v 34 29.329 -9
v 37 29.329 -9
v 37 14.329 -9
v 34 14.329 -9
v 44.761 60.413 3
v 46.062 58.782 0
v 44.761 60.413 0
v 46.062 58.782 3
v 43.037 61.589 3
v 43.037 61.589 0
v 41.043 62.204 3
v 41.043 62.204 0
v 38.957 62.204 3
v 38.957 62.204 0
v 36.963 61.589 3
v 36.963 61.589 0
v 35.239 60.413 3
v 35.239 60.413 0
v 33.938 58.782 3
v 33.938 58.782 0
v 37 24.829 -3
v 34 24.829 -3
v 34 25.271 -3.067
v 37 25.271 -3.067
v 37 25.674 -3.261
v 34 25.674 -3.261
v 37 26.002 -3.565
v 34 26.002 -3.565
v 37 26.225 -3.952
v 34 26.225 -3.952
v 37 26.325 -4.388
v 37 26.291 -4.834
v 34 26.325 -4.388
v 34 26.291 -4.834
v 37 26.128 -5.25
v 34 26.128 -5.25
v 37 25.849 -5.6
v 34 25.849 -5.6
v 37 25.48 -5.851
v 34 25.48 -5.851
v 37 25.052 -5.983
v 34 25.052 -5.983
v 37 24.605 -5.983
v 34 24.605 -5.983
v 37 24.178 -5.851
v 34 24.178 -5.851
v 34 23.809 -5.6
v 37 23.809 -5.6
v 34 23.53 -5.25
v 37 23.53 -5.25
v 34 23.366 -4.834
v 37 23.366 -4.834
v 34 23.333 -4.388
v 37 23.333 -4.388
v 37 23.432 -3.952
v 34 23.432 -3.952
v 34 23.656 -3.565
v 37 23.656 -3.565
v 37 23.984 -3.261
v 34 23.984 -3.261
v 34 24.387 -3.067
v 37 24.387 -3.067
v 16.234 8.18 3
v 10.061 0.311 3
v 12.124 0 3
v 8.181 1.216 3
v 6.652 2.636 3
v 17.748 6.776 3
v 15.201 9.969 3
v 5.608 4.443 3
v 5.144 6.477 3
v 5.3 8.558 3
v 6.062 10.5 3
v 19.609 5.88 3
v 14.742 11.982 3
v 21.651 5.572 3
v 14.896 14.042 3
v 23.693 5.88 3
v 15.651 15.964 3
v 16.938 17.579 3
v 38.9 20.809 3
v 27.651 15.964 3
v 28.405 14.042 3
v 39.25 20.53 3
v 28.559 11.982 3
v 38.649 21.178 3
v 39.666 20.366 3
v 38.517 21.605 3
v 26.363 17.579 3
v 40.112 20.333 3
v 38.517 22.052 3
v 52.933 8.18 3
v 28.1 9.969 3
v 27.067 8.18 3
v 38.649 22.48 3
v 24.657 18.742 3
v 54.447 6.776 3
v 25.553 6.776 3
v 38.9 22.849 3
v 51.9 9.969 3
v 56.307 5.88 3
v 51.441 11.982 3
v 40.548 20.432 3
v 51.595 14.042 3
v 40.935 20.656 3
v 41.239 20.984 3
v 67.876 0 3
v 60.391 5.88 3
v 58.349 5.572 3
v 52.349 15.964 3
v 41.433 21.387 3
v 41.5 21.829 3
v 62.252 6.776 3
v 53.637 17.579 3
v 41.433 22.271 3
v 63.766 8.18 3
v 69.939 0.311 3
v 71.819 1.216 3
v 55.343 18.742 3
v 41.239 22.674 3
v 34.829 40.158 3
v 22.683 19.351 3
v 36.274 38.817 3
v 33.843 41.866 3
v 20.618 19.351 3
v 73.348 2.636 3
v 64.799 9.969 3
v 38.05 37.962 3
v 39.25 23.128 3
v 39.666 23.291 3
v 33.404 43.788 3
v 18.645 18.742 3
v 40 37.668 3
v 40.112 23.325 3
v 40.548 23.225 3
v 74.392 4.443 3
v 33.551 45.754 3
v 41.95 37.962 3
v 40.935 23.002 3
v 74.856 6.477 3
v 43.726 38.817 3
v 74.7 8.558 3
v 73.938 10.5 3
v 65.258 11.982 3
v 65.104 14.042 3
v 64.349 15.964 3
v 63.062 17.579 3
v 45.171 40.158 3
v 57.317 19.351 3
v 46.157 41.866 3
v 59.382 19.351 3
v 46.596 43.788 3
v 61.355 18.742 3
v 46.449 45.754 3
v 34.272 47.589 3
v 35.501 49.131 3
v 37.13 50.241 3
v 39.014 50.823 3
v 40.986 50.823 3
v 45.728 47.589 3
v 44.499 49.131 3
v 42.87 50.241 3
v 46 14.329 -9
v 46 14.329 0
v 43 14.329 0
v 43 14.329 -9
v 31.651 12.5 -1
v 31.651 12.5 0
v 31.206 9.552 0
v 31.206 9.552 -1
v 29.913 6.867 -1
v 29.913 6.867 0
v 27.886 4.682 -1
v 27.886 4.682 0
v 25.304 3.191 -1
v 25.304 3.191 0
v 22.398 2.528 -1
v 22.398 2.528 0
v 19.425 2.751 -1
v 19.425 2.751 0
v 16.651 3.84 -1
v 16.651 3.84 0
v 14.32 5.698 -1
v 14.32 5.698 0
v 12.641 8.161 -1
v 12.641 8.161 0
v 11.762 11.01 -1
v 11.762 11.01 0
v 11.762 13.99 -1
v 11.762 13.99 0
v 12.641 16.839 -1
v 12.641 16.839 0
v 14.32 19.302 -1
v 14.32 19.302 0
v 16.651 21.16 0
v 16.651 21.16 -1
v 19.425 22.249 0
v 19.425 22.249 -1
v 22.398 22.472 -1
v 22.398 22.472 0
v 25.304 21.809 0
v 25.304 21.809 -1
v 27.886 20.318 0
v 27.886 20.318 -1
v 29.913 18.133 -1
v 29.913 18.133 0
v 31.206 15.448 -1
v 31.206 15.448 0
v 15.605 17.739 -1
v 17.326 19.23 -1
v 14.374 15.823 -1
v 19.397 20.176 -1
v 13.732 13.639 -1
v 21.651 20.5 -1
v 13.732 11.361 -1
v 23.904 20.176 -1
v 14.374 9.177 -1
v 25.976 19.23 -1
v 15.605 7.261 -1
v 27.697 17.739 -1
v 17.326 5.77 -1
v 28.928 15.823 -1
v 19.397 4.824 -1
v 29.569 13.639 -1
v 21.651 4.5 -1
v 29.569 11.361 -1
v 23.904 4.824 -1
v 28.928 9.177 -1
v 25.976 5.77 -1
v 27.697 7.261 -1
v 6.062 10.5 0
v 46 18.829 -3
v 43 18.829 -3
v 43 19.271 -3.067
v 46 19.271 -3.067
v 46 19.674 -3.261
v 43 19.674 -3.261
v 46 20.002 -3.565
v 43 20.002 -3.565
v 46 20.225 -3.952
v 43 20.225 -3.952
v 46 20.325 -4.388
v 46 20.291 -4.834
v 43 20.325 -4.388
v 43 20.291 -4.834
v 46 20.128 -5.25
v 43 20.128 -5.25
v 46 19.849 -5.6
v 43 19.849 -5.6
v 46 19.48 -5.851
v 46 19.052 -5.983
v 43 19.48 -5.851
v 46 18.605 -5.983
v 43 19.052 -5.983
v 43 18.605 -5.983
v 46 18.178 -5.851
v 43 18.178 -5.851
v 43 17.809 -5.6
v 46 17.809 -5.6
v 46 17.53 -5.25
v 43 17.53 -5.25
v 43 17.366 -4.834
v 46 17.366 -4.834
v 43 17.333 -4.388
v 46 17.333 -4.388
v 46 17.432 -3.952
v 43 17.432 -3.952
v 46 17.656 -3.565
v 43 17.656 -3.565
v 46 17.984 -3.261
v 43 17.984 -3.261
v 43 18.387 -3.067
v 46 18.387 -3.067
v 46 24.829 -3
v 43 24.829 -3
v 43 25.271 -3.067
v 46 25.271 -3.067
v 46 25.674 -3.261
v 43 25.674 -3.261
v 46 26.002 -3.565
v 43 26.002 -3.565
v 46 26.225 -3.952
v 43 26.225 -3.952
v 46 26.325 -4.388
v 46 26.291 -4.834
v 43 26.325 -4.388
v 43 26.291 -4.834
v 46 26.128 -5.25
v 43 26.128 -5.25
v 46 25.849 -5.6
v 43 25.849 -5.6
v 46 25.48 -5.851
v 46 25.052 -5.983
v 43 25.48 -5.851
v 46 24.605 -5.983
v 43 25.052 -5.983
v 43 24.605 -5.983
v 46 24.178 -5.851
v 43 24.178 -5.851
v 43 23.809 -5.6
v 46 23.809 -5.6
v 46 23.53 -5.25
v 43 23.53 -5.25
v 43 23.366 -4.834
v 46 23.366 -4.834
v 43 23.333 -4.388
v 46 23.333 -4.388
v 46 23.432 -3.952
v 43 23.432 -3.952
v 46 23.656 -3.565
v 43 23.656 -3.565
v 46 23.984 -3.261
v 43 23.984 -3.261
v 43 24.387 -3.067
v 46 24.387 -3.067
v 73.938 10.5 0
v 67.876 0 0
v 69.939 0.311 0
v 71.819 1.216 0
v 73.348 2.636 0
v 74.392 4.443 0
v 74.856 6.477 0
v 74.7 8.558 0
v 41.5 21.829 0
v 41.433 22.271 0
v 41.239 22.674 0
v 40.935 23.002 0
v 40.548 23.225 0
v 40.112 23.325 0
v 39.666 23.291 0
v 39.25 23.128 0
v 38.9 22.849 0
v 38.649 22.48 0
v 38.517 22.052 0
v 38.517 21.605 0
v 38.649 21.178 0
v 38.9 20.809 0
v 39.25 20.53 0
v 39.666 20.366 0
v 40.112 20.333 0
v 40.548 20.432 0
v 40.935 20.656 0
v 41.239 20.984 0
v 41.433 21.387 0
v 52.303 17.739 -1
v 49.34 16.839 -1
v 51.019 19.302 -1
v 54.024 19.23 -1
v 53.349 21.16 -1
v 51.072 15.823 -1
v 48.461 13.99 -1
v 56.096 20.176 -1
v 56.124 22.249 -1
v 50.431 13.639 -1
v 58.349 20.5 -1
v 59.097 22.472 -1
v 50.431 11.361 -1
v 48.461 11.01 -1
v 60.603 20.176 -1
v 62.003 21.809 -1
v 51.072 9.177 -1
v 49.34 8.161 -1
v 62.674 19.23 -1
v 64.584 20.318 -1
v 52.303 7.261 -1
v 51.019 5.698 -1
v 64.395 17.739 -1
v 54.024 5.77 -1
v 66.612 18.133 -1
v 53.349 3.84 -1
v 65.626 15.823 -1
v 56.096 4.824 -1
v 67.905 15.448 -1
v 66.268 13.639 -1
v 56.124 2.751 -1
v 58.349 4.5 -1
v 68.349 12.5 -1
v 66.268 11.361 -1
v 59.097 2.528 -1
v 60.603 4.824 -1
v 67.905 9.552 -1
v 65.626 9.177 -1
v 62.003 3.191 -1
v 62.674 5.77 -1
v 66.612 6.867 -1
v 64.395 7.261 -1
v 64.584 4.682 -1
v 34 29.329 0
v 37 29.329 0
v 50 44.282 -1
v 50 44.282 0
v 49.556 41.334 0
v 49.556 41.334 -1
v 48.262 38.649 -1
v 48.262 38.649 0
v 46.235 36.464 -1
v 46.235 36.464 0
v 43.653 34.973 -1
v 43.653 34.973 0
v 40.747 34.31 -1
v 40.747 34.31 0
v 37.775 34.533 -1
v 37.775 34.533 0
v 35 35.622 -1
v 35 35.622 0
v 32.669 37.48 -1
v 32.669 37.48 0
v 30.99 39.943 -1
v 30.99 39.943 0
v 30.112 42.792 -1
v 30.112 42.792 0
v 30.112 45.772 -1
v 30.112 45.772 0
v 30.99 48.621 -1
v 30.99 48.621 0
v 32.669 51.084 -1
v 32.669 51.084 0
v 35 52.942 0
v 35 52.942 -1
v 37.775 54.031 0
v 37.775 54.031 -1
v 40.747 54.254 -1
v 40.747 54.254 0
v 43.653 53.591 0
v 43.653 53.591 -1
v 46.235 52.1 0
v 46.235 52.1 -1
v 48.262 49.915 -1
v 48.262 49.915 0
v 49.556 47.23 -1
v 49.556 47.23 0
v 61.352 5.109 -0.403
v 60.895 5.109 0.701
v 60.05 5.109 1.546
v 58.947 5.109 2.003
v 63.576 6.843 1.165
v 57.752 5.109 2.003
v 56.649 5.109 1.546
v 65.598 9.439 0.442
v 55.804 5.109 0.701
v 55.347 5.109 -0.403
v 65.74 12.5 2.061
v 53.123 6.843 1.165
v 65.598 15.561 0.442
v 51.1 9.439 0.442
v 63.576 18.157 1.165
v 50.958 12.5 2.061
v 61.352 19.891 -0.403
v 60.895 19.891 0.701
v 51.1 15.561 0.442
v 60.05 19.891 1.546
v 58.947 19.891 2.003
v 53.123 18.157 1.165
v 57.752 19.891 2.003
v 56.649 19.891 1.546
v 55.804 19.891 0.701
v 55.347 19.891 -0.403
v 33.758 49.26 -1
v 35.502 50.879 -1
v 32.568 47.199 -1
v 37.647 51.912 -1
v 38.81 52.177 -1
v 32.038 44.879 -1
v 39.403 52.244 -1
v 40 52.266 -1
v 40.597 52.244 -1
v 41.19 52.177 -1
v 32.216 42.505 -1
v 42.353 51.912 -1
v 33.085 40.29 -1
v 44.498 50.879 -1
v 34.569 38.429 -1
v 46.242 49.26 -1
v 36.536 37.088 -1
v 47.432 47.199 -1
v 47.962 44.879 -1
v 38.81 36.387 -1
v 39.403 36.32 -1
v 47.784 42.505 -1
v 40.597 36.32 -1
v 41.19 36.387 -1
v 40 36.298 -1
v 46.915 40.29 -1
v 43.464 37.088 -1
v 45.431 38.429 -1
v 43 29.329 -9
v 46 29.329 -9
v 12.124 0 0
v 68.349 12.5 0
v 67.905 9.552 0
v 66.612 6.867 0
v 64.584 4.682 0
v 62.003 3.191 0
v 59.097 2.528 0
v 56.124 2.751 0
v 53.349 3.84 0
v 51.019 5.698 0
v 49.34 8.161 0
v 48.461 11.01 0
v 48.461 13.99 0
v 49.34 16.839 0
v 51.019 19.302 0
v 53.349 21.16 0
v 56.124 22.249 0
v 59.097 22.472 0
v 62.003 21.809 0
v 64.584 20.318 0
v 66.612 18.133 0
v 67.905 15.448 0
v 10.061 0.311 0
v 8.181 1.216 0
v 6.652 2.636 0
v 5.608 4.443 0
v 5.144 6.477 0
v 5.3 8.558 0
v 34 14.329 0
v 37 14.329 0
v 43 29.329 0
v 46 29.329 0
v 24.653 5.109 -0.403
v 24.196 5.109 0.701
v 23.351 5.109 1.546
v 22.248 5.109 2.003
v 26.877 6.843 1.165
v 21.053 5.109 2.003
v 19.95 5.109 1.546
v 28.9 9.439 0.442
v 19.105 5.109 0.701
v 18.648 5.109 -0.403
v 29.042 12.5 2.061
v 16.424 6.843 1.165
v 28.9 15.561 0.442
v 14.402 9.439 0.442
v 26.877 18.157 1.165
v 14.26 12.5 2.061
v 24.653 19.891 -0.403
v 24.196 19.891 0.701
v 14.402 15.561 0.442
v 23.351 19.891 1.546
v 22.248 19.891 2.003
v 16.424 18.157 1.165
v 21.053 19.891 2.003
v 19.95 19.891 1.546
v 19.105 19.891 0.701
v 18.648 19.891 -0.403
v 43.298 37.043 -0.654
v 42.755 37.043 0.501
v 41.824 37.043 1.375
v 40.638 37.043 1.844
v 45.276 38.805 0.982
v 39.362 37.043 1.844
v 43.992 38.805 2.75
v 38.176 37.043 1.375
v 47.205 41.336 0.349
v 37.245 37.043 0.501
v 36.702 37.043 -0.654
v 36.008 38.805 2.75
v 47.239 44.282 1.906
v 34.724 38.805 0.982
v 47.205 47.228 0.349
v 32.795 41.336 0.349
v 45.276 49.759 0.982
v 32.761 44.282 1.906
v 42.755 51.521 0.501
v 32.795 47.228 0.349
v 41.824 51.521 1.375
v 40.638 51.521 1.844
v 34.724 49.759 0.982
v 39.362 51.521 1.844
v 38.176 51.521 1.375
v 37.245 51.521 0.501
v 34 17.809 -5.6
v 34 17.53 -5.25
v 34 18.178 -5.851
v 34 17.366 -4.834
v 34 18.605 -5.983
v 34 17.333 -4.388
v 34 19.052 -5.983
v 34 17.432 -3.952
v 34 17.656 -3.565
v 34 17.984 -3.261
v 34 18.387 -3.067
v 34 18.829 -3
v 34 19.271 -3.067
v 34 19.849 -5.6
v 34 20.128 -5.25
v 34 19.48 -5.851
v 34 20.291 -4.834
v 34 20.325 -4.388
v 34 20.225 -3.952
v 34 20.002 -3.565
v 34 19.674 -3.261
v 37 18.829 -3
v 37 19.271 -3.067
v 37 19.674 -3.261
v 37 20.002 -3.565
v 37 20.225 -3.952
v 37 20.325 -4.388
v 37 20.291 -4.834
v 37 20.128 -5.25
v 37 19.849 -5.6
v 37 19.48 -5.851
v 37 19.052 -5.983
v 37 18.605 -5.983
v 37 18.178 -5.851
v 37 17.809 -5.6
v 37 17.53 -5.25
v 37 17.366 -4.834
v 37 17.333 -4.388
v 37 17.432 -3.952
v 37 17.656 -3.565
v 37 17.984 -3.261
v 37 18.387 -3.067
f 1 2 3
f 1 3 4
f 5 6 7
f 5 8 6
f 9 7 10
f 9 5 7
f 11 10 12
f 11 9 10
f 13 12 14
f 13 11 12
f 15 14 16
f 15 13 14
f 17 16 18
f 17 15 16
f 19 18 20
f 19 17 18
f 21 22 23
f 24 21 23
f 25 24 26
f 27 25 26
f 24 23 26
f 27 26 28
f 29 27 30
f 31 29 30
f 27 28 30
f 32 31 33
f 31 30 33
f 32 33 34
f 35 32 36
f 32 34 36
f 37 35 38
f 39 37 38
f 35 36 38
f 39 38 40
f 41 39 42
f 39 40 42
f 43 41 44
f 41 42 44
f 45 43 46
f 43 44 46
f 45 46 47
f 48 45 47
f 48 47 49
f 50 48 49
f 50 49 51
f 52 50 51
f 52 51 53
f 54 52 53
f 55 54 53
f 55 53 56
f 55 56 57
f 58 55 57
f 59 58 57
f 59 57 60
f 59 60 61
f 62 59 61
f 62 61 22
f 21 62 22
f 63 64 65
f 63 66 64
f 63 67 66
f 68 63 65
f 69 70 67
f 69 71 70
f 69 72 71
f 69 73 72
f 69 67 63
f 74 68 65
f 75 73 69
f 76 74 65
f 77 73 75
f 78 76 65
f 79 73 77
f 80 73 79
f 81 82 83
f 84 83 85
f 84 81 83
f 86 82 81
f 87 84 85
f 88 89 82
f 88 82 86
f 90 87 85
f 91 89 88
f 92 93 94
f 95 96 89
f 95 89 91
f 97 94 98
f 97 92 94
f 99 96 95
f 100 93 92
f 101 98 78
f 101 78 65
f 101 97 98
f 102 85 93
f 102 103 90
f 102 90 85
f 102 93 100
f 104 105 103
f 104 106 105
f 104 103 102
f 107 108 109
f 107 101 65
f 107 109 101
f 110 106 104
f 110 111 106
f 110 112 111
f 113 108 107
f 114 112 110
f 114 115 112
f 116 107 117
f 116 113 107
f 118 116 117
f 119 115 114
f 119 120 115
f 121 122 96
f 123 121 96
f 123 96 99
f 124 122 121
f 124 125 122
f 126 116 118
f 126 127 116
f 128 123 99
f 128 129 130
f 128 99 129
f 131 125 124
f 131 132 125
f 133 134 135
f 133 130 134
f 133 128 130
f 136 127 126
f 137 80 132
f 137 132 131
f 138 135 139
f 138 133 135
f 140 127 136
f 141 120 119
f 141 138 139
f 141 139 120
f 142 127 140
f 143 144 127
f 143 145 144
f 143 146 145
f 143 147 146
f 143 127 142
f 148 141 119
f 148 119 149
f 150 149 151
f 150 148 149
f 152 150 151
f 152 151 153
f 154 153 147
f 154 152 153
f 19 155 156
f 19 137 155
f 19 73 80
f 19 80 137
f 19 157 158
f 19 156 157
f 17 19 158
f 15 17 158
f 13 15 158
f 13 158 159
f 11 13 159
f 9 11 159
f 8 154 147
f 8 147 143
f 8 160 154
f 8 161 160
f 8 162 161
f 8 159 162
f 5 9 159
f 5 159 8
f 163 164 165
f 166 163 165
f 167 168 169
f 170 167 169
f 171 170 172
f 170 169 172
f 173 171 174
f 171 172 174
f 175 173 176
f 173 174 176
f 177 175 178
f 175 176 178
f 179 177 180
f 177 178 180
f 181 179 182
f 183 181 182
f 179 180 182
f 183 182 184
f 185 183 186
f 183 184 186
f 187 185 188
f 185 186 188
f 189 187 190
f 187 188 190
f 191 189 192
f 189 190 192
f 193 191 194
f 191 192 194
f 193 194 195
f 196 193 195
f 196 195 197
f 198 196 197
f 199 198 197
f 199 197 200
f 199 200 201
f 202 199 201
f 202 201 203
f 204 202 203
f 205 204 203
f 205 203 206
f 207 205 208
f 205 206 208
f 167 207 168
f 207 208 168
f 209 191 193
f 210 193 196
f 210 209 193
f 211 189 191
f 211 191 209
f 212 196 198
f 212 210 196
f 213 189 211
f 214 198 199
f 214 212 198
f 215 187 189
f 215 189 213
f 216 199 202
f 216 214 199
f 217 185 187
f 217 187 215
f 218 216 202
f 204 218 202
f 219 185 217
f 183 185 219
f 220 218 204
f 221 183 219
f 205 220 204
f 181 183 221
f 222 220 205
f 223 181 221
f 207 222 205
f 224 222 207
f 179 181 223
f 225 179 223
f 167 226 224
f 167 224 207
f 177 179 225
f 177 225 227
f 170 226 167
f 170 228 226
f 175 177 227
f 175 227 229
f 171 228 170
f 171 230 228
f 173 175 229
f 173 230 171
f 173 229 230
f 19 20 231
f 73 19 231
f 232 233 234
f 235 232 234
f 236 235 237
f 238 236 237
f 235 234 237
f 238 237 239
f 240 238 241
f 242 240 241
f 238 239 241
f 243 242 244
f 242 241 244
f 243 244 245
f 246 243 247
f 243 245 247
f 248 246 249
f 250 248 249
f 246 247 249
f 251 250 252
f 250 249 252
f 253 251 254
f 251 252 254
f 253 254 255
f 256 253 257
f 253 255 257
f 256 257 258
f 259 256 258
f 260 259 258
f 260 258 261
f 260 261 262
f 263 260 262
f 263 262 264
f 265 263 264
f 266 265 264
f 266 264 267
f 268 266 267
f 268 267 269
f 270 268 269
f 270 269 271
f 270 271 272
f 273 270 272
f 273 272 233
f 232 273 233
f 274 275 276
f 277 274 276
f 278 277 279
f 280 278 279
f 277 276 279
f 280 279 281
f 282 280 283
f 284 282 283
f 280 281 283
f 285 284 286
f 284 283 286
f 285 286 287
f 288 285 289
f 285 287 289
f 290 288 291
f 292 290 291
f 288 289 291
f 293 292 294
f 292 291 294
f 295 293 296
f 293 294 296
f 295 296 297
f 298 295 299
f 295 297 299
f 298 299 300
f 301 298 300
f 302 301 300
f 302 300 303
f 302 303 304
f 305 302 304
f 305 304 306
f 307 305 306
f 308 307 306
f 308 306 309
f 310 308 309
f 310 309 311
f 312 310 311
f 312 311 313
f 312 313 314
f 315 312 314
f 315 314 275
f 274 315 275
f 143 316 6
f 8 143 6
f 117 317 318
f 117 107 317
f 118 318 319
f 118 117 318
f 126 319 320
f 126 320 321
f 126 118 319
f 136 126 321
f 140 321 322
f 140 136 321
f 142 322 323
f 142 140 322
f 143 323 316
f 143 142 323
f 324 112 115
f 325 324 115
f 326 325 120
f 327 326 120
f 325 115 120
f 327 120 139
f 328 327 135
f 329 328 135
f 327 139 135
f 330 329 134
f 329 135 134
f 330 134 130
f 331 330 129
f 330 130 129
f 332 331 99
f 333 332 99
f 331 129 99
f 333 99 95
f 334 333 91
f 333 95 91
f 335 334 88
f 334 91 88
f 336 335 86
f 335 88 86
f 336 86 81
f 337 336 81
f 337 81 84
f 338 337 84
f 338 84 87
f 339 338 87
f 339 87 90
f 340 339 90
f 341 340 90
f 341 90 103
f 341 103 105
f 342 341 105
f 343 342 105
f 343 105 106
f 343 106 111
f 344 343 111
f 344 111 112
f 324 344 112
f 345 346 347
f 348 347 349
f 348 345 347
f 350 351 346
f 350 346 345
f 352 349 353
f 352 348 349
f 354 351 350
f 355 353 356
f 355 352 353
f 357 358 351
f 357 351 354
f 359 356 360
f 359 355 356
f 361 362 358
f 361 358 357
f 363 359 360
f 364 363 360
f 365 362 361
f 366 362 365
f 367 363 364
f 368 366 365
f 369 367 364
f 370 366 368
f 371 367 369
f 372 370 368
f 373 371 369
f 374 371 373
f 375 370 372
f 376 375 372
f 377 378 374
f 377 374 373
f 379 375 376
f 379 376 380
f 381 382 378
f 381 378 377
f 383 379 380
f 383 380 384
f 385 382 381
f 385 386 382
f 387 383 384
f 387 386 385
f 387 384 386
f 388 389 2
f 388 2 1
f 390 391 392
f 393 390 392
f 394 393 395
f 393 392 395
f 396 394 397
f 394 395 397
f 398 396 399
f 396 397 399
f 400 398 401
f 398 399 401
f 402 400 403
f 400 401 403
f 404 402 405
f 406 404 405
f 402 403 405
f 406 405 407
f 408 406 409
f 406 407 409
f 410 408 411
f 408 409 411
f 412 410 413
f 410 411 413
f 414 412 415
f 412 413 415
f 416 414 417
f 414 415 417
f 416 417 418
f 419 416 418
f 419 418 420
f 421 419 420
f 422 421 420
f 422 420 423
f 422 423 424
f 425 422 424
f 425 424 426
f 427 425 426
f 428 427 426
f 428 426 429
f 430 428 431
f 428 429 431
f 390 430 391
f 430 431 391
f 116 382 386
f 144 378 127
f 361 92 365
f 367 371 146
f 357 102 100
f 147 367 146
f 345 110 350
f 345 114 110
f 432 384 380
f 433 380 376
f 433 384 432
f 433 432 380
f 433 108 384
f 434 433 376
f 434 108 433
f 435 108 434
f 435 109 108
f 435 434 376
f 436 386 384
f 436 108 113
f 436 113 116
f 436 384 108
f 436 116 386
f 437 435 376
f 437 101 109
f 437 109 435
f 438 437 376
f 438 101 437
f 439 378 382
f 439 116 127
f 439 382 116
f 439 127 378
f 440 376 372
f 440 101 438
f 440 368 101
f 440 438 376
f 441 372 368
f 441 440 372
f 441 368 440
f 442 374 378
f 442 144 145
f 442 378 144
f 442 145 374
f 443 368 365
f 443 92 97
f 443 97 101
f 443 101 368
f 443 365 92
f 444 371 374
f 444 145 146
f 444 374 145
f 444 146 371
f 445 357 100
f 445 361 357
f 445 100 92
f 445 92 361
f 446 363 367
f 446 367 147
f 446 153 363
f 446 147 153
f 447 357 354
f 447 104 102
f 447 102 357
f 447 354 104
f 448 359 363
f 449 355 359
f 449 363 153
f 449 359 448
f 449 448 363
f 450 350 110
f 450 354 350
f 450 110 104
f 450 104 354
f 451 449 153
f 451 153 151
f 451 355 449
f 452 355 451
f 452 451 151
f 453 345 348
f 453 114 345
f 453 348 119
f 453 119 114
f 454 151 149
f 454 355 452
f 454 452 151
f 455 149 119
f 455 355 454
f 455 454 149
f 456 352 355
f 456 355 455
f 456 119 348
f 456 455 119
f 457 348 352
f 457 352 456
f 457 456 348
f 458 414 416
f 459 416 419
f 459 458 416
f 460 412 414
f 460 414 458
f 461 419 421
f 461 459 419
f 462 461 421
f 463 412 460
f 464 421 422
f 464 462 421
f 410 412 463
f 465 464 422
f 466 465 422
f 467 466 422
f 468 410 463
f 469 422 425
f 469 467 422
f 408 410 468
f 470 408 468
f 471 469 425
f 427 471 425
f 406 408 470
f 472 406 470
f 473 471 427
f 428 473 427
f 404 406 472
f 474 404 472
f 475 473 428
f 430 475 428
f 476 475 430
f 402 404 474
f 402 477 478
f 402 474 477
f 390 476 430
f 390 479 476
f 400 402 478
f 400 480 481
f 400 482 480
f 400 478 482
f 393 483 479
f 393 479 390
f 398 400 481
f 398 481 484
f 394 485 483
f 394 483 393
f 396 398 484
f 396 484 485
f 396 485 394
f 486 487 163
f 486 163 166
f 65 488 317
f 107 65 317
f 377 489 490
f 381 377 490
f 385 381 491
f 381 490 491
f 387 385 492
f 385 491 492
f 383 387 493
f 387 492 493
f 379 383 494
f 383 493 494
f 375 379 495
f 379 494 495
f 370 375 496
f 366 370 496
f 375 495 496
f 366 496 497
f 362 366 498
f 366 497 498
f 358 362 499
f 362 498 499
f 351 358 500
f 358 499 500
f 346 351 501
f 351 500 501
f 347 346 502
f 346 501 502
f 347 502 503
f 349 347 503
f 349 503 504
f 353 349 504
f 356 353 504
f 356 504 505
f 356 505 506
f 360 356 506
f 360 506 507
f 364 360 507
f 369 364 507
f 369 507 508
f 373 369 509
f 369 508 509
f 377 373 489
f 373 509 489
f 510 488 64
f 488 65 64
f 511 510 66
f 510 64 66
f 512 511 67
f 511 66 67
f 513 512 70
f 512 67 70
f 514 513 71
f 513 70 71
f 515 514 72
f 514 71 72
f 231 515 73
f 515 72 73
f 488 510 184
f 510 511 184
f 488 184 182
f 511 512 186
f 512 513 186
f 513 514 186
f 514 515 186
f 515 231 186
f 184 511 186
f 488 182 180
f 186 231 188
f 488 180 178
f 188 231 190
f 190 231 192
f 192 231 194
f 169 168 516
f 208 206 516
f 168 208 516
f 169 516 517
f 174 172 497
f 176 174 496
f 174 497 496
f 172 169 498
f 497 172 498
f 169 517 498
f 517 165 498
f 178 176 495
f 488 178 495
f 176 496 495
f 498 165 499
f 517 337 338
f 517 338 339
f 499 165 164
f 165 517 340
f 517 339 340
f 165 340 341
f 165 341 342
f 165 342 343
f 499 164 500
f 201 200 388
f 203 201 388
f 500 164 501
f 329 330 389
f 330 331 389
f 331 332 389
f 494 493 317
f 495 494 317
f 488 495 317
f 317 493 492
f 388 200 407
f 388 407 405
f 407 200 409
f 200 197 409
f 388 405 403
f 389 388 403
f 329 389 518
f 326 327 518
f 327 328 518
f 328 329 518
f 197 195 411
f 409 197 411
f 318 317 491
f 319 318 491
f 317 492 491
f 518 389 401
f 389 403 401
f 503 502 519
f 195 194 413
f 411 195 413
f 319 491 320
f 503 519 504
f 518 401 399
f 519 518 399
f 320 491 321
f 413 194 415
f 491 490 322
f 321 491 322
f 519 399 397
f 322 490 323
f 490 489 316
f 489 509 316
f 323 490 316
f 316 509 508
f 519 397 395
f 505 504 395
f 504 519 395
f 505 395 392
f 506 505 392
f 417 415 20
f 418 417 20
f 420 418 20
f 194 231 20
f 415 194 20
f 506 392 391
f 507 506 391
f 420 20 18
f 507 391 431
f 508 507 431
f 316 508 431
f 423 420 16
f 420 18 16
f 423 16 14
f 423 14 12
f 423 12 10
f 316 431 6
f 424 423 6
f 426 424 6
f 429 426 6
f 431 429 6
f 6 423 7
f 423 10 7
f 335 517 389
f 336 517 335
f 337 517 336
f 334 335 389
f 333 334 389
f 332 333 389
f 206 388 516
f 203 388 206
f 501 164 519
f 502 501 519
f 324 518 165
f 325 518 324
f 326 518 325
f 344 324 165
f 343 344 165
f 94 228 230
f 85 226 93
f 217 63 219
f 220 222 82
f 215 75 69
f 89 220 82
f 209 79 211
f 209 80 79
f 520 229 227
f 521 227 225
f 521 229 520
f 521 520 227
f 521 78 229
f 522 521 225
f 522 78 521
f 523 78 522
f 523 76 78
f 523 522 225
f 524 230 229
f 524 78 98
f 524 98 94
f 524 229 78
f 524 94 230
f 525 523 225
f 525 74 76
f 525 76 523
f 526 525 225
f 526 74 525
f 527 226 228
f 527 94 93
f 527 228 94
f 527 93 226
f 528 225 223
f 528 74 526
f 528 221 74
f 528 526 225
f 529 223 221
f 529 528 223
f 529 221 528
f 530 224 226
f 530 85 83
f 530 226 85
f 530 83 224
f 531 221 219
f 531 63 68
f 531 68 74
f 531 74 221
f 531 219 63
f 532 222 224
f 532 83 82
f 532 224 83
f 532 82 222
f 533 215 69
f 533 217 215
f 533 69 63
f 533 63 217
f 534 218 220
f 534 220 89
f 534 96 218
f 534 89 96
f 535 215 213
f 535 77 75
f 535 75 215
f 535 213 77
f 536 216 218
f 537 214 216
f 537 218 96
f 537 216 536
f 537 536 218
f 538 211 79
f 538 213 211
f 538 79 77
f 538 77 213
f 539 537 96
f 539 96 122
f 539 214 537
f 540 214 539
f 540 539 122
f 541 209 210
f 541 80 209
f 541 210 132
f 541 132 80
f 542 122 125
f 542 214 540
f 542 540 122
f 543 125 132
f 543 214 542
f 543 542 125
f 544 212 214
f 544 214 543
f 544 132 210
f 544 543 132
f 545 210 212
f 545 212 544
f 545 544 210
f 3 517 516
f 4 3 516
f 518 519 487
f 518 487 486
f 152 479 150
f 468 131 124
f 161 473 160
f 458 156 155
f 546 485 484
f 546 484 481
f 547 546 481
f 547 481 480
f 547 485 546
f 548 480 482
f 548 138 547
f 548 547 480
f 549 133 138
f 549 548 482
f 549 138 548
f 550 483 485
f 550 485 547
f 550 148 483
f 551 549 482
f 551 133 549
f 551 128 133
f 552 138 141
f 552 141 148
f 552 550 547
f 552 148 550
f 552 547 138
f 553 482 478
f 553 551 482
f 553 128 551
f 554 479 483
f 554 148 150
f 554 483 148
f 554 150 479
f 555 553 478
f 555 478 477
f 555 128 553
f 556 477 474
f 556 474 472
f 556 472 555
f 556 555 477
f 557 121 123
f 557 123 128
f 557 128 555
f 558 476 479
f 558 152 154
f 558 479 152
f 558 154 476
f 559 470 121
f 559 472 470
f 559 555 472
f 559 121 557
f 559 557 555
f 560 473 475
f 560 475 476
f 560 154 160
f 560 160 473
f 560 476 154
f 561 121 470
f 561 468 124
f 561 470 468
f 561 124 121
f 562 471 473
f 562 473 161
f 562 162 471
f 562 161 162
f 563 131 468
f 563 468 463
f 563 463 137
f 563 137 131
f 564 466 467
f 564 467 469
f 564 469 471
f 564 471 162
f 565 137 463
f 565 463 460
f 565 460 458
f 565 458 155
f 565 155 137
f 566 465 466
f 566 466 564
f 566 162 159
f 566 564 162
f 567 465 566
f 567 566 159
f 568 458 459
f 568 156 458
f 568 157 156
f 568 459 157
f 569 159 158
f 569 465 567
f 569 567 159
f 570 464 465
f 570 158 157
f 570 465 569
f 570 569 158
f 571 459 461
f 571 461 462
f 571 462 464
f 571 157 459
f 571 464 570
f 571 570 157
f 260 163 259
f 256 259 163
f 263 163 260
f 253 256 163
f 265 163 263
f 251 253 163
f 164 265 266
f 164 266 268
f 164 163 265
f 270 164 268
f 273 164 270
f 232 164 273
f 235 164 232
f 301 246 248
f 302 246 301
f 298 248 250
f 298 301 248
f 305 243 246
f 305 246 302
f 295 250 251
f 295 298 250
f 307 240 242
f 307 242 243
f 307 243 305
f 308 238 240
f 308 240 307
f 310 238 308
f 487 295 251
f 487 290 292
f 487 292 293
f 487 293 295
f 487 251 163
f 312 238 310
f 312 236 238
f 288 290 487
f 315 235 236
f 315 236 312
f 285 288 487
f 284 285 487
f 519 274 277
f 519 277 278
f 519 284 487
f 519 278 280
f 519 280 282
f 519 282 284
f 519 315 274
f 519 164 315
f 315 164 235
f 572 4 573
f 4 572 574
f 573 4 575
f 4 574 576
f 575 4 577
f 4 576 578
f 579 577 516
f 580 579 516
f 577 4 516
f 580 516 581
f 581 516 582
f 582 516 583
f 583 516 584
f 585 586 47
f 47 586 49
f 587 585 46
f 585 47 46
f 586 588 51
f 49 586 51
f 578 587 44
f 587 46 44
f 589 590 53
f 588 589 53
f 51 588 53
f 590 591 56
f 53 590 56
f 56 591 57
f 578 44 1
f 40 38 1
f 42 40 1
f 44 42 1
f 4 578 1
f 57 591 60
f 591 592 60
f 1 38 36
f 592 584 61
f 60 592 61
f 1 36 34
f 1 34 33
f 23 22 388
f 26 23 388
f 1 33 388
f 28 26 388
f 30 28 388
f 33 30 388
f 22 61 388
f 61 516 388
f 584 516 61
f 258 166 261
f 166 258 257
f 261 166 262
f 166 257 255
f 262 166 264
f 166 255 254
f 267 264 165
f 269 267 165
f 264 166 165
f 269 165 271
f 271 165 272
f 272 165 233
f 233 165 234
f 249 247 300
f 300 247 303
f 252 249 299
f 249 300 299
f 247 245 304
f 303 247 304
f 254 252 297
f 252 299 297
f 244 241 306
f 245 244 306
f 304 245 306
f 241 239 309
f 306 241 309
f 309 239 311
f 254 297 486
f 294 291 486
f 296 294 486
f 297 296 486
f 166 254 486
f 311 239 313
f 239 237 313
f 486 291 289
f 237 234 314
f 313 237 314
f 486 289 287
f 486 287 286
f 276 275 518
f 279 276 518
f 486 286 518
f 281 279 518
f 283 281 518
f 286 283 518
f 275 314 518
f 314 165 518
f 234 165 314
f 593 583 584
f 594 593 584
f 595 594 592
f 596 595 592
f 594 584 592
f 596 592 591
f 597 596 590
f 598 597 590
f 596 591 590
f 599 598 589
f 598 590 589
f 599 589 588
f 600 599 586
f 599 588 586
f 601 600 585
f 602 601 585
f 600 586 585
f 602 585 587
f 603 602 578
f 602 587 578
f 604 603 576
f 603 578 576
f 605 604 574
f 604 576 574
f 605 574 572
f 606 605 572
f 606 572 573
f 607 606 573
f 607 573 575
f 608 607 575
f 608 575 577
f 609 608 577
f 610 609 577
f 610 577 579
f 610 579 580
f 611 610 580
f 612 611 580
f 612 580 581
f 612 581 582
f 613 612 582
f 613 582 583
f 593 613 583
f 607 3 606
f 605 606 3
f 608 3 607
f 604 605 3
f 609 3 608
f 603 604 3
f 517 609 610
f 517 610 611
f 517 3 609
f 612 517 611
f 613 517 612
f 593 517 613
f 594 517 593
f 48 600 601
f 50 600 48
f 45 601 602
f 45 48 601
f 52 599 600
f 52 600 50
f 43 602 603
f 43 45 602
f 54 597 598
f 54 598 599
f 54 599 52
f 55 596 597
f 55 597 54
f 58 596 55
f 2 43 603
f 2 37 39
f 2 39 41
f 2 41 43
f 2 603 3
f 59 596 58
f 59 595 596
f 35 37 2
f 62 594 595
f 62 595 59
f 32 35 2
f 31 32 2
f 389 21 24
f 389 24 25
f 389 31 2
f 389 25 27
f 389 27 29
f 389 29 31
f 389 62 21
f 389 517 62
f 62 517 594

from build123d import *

# Parameters (mm, degrees)
BOSS_EXTRUDE1_DEPTH = 3
FILLET4_R           = 7
FILLET5_R           = 7
FILLET6_R           = 7
SKETCH6_R           = 10
BOSS_EXTRUDE2_DEPTH = 1
SKETCH10_W          = 3
SKETCH10_H          = 15
BOSS_EXTRUDE3_DEPTH = 9
SKETCH11_R          = 1.5
CUT_EXTRUDE4_DEPTH  = 14
SKETCH13_R          = 1.5
CUT_EXTRUDE5_DEPTH  = 10


with BuildPart() as part:
    # Sketch1 → Boss-Extrude1 (new body)
    with BuildSketch(Plane.XY):
        Polygon((0, 0), (80, 0), (40, 69.282032303), align=None)
    extrude(amount=BOSS_EXTRUDE1_DEPTH)

    # Fillet4
    fillet4_edges = [part.edges().sort_by_distance(p)[0] for p in [
        (0, 0, 1.5),
    ]]
    fillet(fillet4_edges, radius=FILLET4_R)

    # Fillet5
    fillet5_edges = [part.edges().sort_by_distance(p)[0] for p in [
        (80, 0, 1.5),
    ]]
    fillet(fillet5_edges, radius=FILLET5_R)

    # Fillet6
    fillet6_edges = [part.edges().sort_by_distance(p)[0] for p in [
        (40, 69.282032303, 1.5),
    ]]
    fillet(fillet6_edges, radius=FILLET6_R)

    # Sketch6 → Boss-Extrude2 (add)
    with BuildSketch(Plane(origin=(0, 0, 0), x_dir=(-1, 0, 0), z_dir=(0, 0, -1))):
        with Locations(Location((-40, 44.282032303, 0), (0, 0, 180))):
            Circle(SKETCH6_R)
        with Locations(Location((-58.349364905, 12.5, 0), (0, 0, 180))):
            Circle(SKETCH6_R)
        with Locations(Location((-21.650635095, 12.5, 0), (0, 0, 180))):
            Circle(SKETCH6_R)
    extrude(amount=BOSS_EXTRUDE2_DEPTH)

    # Sketch7 → Cut-Revolve2 (revolve, cut)
    with BuildSketch(Plane(origin=(0, 0, -1.5), x_dir=(-1, 0, 0), z_dir=(0, 0, -1))):
        with BuildLine():
            Line((-40, 52.282032303), (-40, 36.282032303))
            ThreePointArc((-40, 36.282032303), (-32, 44.282032303), (-40, 52.282032303))
        make_face()
    revolve(axis=Axis((40, 52.282032303, -1.5), (0, -1, 0)), mode=Mode.SUBTRACT)

    # Sketch8 → Cut-Revolve3 (revolve, cut)
    with BuildSketch(Plane(origin=(0, 0, -1), x_dir=(-1, 0, 0), z_dir=(0, 0, -1))):
        with BuildLine():
            Line((-58.349364905, 20.5), (-58.349364905, 4.5))
            ThreePointArc((-58.349364905, 4.5), (-50.349364905, 12.5), (-58.349364905, 20.5))
        make_face()
    revolve(axis=Axis((58.349364905, 20.5, -1), (0, -1, 0)), mode=Mode.SUBTRACT)

    # Sketch9 → Cut-Revolve4 (revolve, cut)
    with BuildSketch(Plane(origin=(0, 0, -1), x_dir=(-1, 0, 0), z_dir=(0, 0, -1))):
        with BuildLine():
            Line((-21.650635095, 20.5), (-21.650635095, 4.5))
            ThreePointArc((-21.650635095, 4.5), (-13.650635095, 12.5), (-21.650635095, 20.5))
        make_face()
    revolve(axis=Axis((21.650635095, 20.5, -1), (0, -1, 0)), mode=Mode.SUBTRACT)

    # Sketch10 → Boss-Extrude3 (add)
    with BuildSketch(Plane(origin=(0, 0, 0), x_dir=(-1, 0, 0), z_dir=(0, 0, -1))):
        with Locations((-35.5, 21.828790282)):
            Rectangle(SKETCH10_W, SKETCH10_H)
        with Locations((-44.5, 21.828790282)):
            Rectangle(SKETCH10_W, SKETCH10_H)
    extrude(amount=BOSS_EXTRUDE3_DEPTH)

    # Sketch11 → Cut-Extrude4 (cut)
    with BuildSketch(Plane.ZY.offset(-34)):
        with Locations((-4.5, 24.828790282)):
            Circle(SKETCH11_R)
        with Locations((-4.5, 18.828790282)):
            Circle(SKETCH11_R)
    extrude(amount=-CUT_EXTRUDE4_DEPTH, mode=Mode.SUBTRACT)

    # Sketch13 → Cut-Extrude5 (cut)
    with BuildSketch(Plane.XY.offset(3)):
        with Locations((40, 21.828790282)):
            Circle(SKETCH13_R)
    extrude(amount=-CUT_EXTRUDE5_DEPTH, mode=Mode.SUBTRACT)


solid = part.part
